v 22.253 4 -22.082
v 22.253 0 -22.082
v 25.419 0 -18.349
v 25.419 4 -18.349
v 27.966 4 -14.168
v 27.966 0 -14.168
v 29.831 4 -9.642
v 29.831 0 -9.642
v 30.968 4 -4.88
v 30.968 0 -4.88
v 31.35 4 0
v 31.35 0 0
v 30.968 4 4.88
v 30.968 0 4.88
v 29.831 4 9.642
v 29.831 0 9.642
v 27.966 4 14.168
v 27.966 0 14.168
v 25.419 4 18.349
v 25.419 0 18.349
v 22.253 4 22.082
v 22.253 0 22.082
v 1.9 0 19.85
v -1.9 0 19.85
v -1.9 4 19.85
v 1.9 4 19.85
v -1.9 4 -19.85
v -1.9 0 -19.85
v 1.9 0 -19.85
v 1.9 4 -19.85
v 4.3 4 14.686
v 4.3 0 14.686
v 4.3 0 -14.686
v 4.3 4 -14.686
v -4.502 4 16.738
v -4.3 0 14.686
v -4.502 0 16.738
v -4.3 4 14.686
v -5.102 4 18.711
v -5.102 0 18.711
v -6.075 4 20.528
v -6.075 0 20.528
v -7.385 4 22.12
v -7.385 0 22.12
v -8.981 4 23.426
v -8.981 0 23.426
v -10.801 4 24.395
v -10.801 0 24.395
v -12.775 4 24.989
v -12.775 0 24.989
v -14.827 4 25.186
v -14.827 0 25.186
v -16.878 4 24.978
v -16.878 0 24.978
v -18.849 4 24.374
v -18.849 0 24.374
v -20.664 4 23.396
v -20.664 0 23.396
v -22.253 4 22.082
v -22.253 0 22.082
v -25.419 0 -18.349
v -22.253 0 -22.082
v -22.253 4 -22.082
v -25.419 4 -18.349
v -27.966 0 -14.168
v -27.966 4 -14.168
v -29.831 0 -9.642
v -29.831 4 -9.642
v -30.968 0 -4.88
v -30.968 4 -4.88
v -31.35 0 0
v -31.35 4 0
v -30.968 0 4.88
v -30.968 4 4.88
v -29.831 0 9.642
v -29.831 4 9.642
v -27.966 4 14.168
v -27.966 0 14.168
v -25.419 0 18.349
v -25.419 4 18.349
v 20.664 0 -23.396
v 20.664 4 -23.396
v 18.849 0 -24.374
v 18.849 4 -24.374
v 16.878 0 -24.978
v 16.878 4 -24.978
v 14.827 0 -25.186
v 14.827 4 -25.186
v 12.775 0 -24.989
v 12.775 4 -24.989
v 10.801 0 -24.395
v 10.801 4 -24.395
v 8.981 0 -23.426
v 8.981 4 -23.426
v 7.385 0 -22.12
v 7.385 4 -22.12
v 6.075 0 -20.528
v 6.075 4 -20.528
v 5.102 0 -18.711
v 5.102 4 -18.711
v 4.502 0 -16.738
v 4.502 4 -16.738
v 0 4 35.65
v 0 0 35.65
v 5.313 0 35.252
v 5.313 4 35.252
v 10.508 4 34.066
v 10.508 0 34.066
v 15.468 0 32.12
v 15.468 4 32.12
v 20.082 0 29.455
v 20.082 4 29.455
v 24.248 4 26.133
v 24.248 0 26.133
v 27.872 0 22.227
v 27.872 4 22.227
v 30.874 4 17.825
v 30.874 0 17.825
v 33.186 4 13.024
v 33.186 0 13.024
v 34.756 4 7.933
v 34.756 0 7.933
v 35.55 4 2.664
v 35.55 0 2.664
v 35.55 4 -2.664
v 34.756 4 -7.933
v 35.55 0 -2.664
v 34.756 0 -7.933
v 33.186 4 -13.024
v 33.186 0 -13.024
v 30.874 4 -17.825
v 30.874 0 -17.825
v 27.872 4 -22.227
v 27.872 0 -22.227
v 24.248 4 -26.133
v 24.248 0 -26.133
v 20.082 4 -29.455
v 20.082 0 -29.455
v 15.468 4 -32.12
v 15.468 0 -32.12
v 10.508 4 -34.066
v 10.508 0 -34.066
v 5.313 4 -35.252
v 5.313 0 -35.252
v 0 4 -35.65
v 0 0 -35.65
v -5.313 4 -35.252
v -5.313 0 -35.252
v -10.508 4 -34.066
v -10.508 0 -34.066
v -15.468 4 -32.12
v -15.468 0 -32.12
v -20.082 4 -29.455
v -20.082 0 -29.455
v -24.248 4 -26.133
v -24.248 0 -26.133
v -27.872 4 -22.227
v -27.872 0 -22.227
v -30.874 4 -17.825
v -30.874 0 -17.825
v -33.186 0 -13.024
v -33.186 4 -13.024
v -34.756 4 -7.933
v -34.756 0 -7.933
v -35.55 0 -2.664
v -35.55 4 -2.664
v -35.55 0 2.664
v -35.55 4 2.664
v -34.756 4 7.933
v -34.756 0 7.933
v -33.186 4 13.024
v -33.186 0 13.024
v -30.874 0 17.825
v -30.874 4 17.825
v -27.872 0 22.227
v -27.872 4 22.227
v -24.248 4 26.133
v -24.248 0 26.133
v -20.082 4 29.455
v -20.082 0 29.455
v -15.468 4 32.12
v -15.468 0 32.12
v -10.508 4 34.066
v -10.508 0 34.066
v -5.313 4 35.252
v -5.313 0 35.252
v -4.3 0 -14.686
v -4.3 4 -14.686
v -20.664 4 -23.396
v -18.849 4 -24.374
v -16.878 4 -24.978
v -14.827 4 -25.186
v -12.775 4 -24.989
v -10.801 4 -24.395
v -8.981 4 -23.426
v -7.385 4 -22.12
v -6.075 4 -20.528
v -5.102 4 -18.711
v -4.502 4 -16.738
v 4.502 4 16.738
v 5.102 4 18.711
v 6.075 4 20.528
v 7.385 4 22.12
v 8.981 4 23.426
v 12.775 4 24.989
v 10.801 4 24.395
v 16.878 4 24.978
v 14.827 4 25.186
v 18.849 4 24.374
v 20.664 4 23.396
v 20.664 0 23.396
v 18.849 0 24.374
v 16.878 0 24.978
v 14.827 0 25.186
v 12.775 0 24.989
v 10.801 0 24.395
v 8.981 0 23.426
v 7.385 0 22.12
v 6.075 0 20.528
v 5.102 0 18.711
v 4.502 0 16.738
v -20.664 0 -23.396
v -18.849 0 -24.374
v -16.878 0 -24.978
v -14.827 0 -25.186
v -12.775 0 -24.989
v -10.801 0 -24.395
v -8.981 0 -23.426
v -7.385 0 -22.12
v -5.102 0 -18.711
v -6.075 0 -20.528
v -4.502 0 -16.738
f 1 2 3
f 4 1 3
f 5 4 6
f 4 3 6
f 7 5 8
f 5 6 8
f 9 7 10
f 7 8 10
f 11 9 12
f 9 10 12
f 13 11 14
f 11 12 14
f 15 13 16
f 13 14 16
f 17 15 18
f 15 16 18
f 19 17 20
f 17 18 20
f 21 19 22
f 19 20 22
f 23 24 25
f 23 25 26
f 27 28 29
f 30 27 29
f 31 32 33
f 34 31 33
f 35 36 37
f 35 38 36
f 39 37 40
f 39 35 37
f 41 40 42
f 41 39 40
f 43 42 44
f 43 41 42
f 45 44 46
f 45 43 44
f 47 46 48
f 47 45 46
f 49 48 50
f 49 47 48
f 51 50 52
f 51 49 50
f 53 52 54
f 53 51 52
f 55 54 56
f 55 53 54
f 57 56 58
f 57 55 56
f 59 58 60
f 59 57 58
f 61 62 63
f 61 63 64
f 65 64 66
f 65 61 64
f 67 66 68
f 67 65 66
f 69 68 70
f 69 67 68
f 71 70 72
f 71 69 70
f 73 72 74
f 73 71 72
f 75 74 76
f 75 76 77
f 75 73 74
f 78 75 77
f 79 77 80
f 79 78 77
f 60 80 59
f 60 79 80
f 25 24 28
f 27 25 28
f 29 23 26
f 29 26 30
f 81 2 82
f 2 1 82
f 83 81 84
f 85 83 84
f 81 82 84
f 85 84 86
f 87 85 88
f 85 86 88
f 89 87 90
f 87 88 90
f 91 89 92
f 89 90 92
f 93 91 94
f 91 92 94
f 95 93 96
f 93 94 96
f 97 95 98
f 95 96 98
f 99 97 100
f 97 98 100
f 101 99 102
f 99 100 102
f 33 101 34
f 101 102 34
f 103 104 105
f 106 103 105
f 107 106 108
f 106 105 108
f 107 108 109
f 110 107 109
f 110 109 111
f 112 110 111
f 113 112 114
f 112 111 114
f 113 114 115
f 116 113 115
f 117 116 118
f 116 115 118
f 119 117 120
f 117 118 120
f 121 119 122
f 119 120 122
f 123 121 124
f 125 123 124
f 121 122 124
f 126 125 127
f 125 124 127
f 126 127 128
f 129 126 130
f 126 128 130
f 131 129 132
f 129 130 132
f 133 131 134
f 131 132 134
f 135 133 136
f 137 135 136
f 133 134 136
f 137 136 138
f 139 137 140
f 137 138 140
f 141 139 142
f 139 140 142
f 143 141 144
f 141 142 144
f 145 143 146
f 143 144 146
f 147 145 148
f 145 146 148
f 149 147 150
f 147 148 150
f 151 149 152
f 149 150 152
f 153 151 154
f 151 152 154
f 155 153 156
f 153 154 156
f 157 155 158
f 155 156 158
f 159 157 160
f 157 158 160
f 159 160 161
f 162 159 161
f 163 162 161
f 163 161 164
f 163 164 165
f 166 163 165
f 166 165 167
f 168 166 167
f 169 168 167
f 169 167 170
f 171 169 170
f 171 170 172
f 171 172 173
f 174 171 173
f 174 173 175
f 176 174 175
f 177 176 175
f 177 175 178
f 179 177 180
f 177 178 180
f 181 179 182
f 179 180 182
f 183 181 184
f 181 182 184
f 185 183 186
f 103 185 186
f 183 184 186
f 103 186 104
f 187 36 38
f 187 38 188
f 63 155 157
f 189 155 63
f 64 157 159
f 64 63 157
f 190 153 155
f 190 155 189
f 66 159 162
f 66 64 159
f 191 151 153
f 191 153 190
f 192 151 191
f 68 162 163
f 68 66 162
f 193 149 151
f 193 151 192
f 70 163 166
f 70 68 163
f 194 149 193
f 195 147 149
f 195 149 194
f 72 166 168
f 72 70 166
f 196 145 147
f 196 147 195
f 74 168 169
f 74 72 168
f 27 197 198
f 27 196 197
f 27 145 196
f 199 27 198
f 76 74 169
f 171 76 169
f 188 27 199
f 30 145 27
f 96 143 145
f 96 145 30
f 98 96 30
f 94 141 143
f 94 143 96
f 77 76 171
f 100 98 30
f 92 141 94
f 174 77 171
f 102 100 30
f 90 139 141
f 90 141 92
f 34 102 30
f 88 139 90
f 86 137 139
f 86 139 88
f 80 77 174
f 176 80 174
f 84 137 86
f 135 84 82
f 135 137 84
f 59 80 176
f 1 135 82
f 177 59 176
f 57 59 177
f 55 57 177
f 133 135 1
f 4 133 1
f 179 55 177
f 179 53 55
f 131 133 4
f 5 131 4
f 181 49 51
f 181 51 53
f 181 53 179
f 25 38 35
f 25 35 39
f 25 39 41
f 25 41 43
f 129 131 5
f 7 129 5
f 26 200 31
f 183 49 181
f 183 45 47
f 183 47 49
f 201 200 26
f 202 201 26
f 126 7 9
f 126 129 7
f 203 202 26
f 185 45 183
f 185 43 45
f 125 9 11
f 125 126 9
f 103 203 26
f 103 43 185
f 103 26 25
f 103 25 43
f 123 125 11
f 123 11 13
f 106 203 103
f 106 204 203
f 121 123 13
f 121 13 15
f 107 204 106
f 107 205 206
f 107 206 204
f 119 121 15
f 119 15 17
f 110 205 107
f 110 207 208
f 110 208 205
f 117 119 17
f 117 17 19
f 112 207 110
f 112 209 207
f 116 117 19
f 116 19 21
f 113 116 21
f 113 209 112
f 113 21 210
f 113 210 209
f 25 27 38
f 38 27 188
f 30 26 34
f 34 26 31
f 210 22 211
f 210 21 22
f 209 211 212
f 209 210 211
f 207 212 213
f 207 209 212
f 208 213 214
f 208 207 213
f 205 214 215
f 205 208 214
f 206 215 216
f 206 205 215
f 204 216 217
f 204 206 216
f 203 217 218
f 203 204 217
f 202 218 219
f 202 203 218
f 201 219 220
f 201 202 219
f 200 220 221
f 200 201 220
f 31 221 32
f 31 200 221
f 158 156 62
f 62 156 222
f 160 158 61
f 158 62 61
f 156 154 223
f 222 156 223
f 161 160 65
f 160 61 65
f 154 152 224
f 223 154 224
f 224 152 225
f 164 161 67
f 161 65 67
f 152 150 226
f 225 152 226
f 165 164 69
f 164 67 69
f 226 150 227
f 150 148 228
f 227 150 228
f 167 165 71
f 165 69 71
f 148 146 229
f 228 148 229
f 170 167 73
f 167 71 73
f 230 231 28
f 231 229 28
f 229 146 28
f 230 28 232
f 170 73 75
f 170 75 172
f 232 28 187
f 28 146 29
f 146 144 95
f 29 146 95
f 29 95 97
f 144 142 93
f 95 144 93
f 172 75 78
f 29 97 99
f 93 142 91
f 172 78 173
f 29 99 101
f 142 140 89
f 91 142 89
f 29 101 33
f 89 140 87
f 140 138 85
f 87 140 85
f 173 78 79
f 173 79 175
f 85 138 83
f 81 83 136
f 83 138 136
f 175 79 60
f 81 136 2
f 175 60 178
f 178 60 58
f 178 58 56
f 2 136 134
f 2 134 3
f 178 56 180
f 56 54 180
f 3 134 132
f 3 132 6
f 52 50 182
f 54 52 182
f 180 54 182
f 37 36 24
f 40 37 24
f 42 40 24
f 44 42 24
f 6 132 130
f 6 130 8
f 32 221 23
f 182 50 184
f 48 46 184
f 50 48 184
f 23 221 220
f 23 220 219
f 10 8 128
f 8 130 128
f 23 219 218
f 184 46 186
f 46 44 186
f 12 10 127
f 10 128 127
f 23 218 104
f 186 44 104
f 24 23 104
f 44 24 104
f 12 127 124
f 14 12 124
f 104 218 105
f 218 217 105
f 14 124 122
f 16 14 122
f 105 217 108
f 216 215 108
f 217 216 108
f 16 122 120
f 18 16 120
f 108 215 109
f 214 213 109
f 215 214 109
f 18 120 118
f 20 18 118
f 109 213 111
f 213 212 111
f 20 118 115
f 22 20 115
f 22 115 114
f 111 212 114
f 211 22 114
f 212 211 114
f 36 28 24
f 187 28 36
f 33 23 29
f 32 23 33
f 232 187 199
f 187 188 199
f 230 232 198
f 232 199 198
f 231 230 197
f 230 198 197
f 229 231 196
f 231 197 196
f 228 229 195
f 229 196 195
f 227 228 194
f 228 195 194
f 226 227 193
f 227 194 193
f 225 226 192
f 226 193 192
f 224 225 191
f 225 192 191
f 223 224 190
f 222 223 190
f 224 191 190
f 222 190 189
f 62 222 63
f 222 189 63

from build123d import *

# Parameters (mm, degrees)
SKETCH1_R           = 35.65
SKETCH1_W           = 3.8
SKETCH1_H           = 39.7
BOSS_EXTRUDE1_DEPTH = 4
FILLET1_R           = 10.5


with BuildPart() as part:
    # Sketch1 → Boss-Extrude1 (new body)
    with BuildSketch(Plane(origin=(0, 0, 0), x_dir=(1, 0, 0), z_dir=(0, 1, 0))):
        with Locations(Location((0, 0, 0), (0, 0, 270))):
            Circle(SKETCH1_R)
        with BuildLine():
            Line((4.3, -31.053703483), (4.3, 31.053703483))
            ThreePointArc((4.3, 31.053703483), (31.35, 0), (4.3, -31.053703483))
        make_face(mode=Mode.SUBTRACT)
        with BuildLine():
            Line((-4.3, -31.053703483), (-4.3, 31.053703483))
            ThreePointArc((-4.3, 31.053703483), (-31.35, 0), (-4.3, -31.053703483))
        make_face(mode=Mode.SUBTRACT)
        Rectangle(SKETCH1_W, SKETCH1_H, mode=Mode.SUBTRACT)
    extrude(amount=BOSS_EXTRUDE1_DEPTH)

    # Fillet1
    fillet1_edges = [part.edges().sort_by_distance(p)[0] for p in [
        (4.3, 2, -31.053703483),
        (4.3, 2, 31.053703483),
        (-4.3, 2, 31.053703483),
        (-4.3, 2, -31.053703483),
    ]]
    fillet(fillet1_edges, radius=FILLET1_R)


solid = part.part
